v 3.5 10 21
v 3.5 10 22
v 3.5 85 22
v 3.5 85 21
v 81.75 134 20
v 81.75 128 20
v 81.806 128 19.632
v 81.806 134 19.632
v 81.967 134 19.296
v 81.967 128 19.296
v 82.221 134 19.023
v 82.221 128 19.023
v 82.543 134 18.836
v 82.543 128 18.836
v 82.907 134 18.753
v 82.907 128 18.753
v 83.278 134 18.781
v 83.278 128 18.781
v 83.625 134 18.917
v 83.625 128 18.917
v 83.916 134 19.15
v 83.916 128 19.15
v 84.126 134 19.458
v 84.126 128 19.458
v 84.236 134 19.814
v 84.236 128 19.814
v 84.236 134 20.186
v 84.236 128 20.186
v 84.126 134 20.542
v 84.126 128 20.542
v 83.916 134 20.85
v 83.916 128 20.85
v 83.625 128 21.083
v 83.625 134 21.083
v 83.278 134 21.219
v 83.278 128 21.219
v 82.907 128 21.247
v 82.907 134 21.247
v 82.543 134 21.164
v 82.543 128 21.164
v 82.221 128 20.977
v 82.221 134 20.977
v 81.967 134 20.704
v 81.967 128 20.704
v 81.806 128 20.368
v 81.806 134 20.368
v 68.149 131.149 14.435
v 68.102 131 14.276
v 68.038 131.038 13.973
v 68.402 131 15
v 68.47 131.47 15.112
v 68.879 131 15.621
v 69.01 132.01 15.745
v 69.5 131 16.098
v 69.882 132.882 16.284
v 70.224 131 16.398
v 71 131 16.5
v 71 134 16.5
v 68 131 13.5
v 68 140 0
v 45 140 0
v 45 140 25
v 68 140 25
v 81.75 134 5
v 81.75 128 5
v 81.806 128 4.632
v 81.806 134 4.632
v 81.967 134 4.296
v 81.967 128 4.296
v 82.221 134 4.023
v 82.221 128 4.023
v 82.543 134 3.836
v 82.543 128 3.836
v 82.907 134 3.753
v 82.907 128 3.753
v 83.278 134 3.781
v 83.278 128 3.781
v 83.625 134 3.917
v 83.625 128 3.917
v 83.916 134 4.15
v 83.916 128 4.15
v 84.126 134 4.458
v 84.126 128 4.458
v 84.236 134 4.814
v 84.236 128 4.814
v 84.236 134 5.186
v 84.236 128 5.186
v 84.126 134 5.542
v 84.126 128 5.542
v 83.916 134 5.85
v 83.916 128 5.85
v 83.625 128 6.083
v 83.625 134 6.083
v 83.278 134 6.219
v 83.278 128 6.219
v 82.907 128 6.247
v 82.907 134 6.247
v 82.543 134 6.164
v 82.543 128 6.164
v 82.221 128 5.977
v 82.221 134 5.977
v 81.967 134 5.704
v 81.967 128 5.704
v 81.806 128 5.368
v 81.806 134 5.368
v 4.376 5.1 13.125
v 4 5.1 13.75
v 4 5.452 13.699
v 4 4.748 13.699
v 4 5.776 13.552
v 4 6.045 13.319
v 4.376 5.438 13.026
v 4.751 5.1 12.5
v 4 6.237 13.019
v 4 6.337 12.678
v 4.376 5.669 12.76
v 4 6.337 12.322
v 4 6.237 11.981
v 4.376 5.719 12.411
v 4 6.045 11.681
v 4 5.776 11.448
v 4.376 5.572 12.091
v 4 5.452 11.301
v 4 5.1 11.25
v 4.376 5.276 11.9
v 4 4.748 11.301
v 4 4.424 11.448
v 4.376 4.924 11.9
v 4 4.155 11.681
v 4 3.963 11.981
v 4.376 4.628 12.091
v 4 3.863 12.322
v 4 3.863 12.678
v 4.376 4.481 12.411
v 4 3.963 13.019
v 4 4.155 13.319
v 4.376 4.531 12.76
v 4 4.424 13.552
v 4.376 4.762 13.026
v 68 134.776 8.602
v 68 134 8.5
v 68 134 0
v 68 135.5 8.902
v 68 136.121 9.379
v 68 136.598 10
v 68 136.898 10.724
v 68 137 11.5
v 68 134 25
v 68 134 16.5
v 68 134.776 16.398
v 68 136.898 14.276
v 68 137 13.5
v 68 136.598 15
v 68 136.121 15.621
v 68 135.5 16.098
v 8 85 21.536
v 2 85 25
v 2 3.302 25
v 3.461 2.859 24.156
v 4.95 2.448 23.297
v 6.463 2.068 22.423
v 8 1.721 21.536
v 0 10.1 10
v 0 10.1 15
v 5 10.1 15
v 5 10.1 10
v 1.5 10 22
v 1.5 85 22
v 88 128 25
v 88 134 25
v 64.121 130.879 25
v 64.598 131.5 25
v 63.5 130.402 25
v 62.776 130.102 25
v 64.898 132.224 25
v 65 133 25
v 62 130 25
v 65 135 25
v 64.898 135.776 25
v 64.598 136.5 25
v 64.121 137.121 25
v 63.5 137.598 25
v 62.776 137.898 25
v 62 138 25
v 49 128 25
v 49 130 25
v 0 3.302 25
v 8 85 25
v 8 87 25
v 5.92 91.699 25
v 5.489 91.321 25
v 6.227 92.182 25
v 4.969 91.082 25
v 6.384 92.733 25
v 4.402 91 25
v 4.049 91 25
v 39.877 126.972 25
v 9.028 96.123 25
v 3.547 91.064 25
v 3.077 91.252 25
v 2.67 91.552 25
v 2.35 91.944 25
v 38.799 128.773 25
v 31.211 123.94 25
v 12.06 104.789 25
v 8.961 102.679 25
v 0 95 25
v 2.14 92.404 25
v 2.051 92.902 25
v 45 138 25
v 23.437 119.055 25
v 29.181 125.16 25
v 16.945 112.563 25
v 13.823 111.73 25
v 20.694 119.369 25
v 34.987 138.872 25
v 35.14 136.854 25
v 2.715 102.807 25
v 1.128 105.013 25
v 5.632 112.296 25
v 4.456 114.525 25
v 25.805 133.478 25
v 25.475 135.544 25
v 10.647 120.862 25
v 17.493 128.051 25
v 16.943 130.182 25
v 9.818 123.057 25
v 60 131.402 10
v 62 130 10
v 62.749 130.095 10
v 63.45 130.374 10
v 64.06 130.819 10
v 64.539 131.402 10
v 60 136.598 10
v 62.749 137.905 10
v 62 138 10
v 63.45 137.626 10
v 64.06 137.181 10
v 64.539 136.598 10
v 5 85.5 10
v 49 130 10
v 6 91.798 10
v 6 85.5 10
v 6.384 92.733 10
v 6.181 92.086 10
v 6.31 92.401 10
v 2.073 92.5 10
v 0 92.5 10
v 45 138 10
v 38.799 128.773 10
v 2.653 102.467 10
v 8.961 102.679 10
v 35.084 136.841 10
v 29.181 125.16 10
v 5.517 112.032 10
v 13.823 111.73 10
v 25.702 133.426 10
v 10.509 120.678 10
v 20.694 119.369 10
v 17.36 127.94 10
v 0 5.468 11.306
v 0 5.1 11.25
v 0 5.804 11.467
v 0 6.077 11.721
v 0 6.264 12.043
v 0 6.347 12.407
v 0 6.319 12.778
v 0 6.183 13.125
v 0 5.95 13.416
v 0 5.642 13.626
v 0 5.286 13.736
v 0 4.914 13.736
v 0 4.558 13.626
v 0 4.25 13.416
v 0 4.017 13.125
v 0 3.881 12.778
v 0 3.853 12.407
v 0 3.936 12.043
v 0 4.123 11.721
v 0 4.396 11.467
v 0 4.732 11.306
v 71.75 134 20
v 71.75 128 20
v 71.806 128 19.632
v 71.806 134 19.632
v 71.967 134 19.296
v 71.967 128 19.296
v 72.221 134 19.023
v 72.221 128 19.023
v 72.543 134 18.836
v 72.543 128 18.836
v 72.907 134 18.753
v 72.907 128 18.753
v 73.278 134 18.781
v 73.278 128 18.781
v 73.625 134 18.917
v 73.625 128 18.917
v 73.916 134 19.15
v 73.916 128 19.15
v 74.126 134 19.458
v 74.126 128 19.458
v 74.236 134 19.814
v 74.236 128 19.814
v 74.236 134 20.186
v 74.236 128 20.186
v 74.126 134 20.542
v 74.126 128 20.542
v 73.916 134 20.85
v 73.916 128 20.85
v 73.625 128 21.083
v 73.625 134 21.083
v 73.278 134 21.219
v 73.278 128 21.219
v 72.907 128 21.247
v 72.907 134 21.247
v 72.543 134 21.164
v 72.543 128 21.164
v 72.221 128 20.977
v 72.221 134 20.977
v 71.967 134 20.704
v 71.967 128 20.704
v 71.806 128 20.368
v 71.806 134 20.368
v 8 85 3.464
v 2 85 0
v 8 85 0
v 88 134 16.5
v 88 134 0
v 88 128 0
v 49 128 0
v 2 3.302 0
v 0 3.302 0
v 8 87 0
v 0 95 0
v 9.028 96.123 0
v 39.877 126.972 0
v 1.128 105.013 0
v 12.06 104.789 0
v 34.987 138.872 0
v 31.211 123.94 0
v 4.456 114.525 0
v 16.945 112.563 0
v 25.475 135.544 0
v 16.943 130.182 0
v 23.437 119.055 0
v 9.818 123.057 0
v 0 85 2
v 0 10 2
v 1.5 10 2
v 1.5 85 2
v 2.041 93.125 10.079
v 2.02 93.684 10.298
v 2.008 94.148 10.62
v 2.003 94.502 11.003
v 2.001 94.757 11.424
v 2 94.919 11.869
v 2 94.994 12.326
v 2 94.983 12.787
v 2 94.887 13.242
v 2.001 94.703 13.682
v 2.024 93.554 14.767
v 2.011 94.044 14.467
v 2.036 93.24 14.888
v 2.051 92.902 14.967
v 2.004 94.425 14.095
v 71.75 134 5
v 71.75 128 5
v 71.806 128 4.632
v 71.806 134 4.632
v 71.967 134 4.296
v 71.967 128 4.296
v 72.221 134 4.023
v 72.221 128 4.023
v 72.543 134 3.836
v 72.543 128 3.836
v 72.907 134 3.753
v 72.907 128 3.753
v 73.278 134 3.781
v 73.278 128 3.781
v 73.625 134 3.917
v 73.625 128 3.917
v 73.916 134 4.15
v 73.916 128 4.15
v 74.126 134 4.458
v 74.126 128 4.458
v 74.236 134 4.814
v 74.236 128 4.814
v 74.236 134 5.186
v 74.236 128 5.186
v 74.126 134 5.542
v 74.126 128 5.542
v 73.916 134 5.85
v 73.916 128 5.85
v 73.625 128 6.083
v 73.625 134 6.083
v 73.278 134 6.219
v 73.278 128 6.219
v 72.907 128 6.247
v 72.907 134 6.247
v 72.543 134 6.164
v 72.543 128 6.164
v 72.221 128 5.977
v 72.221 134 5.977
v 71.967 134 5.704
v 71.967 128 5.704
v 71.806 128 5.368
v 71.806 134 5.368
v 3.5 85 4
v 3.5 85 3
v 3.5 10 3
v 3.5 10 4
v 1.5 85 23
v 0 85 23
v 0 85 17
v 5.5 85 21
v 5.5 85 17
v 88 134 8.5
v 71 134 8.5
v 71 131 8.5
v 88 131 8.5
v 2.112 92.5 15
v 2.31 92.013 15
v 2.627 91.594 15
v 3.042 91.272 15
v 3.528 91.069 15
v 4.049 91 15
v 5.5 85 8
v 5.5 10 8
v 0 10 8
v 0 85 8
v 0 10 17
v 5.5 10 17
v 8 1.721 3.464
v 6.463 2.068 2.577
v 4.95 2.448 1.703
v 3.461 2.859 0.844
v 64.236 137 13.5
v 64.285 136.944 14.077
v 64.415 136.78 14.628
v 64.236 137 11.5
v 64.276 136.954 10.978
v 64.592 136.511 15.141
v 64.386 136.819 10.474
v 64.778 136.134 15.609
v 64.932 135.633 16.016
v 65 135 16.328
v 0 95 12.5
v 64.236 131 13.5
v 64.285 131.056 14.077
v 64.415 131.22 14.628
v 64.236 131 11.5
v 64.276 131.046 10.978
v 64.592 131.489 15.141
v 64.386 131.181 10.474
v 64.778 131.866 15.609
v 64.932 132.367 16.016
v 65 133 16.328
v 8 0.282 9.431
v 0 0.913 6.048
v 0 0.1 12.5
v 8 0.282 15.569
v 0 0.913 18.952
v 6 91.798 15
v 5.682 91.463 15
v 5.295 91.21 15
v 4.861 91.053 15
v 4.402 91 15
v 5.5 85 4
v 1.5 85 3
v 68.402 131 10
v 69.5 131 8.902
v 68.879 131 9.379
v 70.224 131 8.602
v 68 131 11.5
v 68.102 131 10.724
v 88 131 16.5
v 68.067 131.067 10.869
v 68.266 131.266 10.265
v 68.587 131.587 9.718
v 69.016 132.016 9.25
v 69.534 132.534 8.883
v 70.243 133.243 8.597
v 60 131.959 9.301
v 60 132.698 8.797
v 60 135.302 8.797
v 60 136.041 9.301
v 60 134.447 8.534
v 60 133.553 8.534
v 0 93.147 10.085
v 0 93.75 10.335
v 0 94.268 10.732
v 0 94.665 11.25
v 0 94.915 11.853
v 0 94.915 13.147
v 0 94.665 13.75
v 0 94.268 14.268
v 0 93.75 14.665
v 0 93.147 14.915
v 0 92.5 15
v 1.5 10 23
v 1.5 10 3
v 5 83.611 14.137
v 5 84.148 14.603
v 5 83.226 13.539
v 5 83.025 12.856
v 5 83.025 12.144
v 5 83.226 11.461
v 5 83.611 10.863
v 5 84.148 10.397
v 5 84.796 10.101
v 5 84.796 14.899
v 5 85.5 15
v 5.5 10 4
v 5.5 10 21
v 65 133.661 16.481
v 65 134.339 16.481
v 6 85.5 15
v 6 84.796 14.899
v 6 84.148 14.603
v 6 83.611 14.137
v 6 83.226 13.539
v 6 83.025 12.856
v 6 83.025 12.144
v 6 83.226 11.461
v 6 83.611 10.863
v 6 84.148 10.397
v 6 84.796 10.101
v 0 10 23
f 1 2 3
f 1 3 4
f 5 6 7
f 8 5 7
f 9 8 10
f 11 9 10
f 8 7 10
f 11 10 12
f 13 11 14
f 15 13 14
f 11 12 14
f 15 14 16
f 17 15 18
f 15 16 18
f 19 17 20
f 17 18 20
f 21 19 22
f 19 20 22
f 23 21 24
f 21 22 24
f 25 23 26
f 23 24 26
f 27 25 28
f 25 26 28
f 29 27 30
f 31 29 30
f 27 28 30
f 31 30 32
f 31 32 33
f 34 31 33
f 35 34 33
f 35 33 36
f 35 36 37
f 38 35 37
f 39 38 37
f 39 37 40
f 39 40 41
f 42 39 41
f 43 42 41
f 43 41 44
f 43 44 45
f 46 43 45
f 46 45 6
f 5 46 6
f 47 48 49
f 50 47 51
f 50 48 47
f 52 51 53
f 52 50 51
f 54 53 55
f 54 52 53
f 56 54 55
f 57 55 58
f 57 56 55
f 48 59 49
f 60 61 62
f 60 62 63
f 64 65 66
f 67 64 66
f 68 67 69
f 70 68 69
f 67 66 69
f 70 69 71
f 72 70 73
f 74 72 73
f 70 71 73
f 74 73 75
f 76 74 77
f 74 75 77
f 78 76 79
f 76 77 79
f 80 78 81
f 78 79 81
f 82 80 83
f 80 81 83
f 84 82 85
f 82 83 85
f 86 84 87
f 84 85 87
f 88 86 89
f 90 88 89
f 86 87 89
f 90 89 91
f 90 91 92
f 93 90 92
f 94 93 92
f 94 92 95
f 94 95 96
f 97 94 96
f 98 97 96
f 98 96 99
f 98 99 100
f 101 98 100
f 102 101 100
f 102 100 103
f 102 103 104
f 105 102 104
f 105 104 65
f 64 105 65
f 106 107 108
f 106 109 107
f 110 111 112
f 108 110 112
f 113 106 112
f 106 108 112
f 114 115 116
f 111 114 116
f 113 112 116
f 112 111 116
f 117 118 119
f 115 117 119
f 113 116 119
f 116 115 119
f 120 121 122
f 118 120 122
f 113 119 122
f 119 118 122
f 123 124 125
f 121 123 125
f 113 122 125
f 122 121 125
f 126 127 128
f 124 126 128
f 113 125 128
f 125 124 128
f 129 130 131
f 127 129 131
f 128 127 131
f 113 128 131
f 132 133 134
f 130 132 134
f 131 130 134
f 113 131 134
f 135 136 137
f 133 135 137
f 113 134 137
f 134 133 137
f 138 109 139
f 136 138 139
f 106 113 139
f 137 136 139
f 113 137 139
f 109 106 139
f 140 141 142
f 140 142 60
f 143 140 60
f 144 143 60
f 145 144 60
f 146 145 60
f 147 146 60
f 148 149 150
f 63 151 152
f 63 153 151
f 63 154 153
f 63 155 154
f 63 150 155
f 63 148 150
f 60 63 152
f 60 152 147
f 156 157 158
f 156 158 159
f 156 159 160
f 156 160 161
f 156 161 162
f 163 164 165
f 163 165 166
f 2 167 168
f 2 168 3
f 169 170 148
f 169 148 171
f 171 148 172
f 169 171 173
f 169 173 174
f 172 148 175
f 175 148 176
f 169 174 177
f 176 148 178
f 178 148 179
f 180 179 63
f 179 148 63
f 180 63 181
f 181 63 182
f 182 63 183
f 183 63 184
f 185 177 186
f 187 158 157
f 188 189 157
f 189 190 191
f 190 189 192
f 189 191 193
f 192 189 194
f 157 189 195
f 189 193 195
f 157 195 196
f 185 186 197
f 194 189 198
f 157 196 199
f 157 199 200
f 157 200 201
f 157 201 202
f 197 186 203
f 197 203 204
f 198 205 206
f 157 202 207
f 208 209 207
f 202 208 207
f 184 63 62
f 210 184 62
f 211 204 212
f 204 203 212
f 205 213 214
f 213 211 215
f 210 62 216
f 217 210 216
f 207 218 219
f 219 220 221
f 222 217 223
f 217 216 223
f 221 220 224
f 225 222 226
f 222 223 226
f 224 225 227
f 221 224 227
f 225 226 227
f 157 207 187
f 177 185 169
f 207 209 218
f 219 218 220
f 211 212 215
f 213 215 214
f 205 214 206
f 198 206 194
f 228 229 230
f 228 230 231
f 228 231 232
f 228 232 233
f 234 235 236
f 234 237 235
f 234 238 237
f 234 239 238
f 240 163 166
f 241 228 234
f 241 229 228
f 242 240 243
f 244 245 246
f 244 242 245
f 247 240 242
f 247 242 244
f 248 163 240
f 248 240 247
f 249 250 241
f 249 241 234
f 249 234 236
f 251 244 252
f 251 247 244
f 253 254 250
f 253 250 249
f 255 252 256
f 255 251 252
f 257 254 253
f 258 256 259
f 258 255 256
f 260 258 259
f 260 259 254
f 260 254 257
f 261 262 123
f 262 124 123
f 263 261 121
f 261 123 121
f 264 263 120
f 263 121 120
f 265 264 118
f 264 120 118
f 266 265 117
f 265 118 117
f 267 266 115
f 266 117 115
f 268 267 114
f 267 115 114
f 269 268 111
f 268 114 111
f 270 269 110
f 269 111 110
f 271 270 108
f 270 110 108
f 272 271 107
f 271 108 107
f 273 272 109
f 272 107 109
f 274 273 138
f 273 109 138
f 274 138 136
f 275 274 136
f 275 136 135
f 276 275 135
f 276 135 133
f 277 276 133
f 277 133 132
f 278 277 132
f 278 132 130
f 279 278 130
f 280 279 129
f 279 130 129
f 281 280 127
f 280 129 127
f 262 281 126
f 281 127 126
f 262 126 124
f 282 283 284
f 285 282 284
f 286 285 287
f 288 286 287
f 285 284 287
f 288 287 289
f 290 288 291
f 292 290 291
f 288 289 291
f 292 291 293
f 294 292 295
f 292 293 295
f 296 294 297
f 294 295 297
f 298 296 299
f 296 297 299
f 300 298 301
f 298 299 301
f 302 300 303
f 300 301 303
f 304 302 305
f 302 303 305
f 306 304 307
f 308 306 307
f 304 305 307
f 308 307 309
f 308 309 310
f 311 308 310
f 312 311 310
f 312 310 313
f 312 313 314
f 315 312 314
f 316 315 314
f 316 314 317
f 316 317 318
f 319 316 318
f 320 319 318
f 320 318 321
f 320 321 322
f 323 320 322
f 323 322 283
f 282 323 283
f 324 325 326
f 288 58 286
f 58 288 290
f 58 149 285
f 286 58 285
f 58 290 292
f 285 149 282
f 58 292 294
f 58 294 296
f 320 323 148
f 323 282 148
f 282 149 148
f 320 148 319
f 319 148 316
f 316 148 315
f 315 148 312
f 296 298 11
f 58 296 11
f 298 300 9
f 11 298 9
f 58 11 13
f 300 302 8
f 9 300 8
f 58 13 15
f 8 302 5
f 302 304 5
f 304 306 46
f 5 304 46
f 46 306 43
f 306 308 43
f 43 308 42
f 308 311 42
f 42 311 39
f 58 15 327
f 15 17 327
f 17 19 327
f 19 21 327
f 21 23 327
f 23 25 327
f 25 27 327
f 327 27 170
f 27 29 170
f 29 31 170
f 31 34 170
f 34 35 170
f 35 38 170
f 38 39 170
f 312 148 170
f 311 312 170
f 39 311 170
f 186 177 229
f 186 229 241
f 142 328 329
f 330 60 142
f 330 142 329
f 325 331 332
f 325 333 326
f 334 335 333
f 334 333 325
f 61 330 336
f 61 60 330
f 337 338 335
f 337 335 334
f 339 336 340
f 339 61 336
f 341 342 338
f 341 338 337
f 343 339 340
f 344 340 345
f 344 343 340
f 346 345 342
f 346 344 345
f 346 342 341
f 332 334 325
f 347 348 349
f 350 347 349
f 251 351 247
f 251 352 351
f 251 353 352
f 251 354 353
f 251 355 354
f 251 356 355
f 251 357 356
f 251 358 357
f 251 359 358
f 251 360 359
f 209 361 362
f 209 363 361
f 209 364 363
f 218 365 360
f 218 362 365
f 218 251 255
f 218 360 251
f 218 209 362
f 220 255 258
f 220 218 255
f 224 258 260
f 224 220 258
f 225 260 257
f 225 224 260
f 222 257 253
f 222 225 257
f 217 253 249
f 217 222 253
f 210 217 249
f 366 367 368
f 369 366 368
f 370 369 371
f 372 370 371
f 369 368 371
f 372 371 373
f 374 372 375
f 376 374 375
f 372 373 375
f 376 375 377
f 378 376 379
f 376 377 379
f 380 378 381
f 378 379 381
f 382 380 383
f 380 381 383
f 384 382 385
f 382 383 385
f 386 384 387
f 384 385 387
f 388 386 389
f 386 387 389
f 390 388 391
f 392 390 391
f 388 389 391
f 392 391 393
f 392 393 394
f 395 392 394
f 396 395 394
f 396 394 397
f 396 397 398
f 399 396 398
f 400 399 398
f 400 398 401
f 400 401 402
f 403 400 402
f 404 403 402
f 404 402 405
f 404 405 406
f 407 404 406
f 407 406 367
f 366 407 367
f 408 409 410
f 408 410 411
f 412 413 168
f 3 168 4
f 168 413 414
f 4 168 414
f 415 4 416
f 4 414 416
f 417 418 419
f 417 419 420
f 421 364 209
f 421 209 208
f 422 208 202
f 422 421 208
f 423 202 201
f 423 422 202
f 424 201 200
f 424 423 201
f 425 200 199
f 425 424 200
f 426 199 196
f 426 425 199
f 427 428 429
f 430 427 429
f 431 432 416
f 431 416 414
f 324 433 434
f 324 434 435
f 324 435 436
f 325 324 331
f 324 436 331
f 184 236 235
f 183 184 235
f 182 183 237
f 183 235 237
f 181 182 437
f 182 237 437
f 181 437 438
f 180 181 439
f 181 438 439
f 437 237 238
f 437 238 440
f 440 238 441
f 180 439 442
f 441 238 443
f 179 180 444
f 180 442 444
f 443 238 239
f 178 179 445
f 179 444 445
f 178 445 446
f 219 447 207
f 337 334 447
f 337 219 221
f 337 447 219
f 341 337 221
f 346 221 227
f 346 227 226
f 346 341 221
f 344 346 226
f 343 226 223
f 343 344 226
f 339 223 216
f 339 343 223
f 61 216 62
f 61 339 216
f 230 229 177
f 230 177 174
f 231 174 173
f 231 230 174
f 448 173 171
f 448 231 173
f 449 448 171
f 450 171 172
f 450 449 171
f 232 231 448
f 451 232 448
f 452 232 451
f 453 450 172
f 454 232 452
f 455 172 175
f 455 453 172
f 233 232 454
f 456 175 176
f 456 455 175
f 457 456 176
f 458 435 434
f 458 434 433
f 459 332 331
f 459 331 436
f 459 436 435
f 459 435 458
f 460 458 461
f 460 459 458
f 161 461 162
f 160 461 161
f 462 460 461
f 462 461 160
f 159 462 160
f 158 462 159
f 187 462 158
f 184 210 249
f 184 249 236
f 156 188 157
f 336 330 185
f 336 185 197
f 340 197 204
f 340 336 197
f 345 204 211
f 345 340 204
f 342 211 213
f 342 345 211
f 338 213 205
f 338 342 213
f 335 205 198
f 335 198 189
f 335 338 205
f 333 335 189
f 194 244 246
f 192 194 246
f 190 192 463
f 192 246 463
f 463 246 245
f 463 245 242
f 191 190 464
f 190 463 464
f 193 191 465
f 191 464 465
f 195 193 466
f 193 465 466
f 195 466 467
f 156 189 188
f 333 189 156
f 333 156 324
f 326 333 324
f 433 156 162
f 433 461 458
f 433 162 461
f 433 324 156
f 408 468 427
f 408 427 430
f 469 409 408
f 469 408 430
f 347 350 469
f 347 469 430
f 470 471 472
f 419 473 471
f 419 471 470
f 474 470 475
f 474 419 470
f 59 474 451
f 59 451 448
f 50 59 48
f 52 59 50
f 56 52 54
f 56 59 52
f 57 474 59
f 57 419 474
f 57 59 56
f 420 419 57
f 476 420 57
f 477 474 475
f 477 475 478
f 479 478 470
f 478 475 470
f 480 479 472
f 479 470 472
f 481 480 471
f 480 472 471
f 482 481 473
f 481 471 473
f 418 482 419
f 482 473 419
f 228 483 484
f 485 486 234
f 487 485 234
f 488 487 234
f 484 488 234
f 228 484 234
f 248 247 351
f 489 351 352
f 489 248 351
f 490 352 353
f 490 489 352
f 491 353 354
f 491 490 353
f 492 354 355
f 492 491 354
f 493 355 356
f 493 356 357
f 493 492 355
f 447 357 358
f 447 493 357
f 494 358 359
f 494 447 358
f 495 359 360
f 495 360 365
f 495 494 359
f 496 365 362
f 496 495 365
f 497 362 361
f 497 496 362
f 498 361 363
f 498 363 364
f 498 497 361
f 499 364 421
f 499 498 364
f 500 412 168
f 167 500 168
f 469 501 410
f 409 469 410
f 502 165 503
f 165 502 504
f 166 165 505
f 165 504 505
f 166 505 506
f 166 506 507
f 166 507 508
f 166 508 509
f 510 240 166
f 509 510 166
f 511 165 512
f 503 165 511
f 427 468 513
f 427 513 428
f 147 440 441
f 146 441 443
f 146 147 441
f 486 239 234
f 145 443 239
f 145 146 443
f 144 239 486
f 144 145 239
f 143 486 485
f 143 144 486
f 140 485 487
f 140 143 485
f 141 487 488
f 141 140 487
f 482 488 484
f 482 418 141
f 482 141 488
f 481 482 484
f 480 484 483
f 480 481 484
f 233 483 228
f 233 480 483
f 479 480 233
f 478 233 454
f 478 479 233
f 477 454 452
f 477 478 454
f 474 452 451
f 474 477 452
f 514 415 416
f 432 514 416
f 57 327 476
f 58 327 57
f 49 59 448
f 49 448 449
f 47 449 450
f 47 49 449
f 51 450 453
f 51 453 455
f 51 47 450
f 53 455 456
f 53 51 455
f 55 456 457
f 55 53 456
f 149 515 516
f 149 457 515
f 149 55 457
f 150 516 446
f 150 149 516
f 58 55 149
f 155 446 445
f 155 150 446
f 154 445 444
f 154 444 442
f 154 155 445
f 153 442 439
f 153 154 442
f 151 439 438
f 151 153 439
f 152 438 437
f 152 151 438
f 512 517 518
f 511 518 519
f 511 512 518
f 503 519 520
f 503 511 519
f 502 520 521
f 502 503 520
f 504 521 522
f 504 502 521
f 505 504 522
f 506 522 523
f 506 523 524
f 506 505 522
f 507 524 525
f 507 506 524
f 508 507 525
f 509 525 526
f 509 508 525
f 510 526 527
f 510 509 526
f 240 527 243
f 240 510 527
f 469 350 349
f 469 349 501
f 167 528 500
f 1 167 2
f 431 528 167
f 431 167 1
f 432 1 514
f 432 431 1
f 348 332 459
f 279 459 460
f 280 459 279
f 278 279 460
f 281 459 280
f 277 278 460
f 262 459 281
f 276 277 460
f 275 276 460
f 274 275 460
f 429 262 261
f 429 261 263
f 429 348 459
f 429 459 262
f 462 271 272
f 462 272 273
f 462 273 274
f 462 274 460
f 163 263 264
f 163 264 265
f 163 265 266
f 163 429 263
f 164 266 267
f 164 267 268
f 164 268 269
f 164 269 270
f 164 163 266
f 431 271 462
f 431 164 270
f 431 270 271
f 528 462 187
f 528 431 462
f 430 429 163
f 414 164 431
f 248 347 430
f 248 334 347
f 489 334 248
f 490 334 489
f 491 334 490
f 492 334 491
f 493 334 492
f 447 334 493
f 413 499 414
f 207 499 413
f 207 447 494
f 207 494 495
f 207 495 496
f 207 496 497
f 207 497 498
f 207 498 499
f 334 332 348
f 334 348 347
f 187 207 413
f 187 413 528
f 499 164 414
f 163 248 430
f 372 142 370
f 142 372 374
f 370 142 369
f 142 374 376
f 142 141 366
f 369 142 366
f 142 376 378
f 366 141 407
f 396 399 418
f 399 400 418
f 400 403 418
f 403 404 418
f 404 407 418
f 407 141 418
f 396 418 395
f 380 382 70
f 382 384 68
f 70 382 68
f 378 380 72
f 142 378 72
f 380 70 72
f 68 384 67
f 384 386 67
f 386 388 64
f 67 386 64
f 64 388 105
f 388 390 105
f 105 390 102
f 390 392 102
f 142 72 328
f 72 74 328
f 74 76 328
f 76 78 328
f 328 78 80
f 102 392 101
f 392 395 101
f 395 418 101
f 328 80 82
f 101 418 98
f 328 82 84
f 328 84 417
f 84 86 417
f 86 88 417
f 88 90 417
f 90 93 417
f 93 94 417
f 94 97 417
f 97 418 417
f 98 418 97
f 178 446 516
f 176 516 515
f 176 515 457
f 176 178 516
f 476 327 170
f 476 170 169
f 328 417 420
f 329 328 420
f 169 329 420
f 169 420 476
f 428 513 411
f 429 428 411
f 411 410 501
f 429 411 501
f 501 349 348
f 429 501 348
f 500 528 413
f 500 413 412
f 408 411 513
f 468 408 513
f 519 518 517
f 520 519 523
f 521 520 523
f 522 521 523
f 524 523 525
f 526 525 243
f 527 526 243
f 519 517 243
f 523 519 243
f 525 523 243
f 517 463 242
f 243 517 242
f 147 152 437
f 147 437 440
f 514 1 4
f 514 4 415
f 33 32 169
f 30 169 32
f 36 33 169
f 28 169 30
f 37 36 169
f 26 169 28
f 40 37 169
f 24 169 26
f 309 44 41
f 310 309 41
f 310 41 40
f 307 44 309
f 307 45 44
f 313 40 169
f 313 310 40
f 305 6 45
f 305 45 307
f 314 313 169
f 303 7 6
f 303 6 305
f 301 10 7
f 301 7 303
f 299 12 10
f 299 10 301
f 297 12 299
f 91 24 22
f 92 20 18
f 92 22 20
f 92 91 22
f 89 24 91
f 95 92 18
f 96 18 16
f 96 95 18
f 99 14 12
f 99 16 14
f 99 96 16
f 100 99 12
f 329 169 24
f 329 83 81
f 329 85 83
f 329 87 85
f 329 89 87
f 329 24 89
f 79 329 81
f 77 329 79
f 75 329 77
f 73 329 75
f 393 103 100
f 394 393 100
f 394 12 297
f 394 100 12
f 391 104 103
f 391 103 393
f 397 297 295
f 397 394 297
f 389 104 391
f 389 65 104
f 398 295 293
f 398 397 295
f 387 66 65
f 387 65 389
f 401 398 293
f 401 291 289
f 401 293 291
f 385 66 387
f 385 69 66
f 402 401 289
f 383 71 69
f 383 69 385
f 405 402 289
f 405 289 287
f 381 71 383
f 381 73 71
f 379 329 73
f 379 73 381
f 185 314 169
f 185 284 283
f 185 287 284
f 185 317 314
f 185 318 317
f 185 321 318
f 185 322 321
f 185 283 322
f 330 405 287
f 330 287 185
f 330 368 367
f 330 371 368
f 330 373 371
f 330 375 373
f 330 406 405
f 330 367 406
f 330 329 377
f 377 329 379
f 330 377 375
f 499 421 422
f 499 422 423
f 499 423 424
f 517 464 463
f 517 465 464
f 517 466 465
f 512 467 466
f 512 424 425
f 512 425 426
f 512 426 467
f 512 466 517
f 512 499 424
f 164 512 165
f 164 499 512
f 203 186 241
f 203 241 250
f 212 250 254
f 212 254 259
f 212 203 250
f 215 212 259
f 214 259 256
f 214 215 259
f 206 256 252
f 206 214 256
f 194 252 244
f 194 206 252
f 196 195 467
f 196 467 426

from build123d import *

# Parameters (mm, degrees)
EXTRUDE_1_DEPTH      = 25
SKETCH_2_W           = 20.000000000000014
SKETCH_2_H           = 6
CUT_EXTRUDE_1_DEPTH  = 168.23934943666816
CUT_EXTRUDE_2_DEPTH  = 85
CUT_EXTRUDE_4_DEPTH  = 5
CUT_EXTRUDE_3_REACH  = 169.239
FILLET_3_R           = 2
FILLET_4_R           = 3
CUT_EXTRUDE_6_DEPTH  = 75
M3X0_51_D            = 2.5
CUT_EXTRUDE_7_REACH  = 169.239
CUT_EXTRUDE_8_DEPTH  = 3
FILLET_8_R           = 3
CUT_EXTRUDE_9_DEPTH  = 28
CUT_EXTRUDE_10_DEPTH = 6
EXTRUDE_2_DEPTH      = 5
M3X0_52_D            = 2.5
M3X0_52_DEPTH        = 4
M3X0_52_TIP          = 0.7510757737844503


with BuildPart() as part:
    # Эскиз1 → Бобышка-Вытянуть1 (new body)
    with BuildSketch(Plane.XY):
        with BuildLine():
            Line((0, 0), (0, 95))
            ThreePointArc((0, 95), (13.18019484660537, 126.81980515339464), (45, 140))
            Line((45, 140), (88, 140))
            Line((88, 140), (88, 128))
            Line((88, 128), (49, 127.99999999999997))
            ThreePointArc((49, 127.99999999999997), (20.00862197135158, 115.99137802864843), (8.000000000000002, 87))
            Line((8.000000000000002, 87), (8, 0))
            Line((8, 0), (0, 0))
        make_face()
    extrude(amount=EXTRUDE_1_DEPTH)

    # Эскиз2 → Вырез-Вытянуть1 (cut, through all)
    with BuildSketch(Plane.XY.offset(25)):
        with Locations((78, 137)):
            Rectangle(SKETCH_2_W, SKETCH_2_H)
    extrude(amount=-CUT_EXTRUDE_1_DEPTH, mode=Mode.SUBTRACT)

    # Эскиз5 → Вырез-Вытянуть2 (cut)
    with BuildSketch(Plane.XZ):
        Polygon((8, 3.4641016151377366), (2, 0), (8, 0), (10.194072484648698, 0), (10.1940724846487, 4.730849954771208), align=None)
        Polygon((1.9999999999999971, 25), (7.999999999999993, 25), (10.194072484648695, 25), (10.194072484648698, 20.26915004522879), (7.999999999999998, 21.535898384862264), align=None)
    extrude(amount=-CUT_EXTRUDE_2_DEPTH, mode=Mode.SUBTRACT)

    # Эскиз6 → Вырез-Вытянуть4 (cut)
    with BuildSketch(Plane.ZY):
        with BuildLine():
            Line((10.000000000000004, -11.916065179701535), (10.000000000000004, 92.5))
            ThreePointArc((10.000000000000004, 92.5), (12.500000000000004, 95), (15.000000000000005, 92.5))
            Line((15.000000000000005, 92.5), (15.000000000000005, -11.916065179701535))
            ThreePointArc((15.000000000000005, -11.916065179701535), (12.500000000000004, -14.416065179701535), (10.000000000000004, -11.916065179701535))
        make_face()
    extrude(amount=-CUT_EXTRUDE_4_DEPTH, mode=Mode.SUBTRACT)

    # Вырез-Вытянуть3: up to this face of the body (flat: up to its plane)
    cut_extrude_3_end = Plane(part.part.faces().sort_by_distance((2.5, 46.25, 10))[0])
    # Эскиз3 → Вырез-Вытянуть3 (cut, up to the picked face)
    with BuildSketch(Plane(origin=(0, 0, 25), x_dir=(-1, 0, 0), z_dir=(0, 0, -1)), mode=Mode.PRIVATE) as cut_extrude_3_sk1:
        with BuildLine():
            Line((-64.99999999999999, 138), (-64.99999999999999, 130))
            Line((-64.99999999999999, 130), (-49.00000000000001, 130))
            ThreePointArc((-49.00000000000001, 130), (-20.04313552885945, 118.78836265050464), (-6.186450742784722, 90.9999999999999))
            Line((-6.186450742784722, 90.9999999999999), (-2.186450742784722, 90.9999999999999))
            ThreePointArc((-2.186450742784722, 90.9999999999999), (-13.211637349495152, 123.9568644711403), (-44.999999999999545, 138))
            Line((-44.999999999999545, 138), (-64.99999999999999, 138))
        make_face()
    cut_extrude_3_tool1 = split(extrude(cut_extrude_3_sk1.sketch, amount=CUT_EXTRUDE_3_REACH, mode=Mode.PRIVATE), bisect_by=cut_extrude_3_end, keep=Keep.BOTH, mode=Mode.PRIVATE)
    add(cut_extrude_3_tool1.solids().sort_by(Axis((55, 137.213997, 25), (0, 0, -1)))[0], mode=Mode.SUBTRACT)

    # Скругление3
    fillet_3_edges = [part.edges().sort_by_distance(p)[0] for p in [
        (6.186450742784729, 90.9999999999999, 17.5),
        (2.186450742784718, 90.9999999999999, 20.000000000000004),
    ]]
    fillet(fillet_3_edges, radius=FILLET_3_R)

    # Скругление4
    fillet_4_edges = [part.edges().sort_by_distance(p)[0] for p in [
        (64.99999999999999, 138, 17.5),
        (64.99999999999999, 130, 17.5),
    ]]
    fillet(fillet_4_edges, radius=FILLET_4_R)

    # Эскиз8 → Вырез-Вытянуть6 (cut)
    with BuildSketch(Plane(origin=(0, 10, 0), x_dir=(1, 0, 0), z_dir=(0, 1, 0))):
        Polygon((0, -2), (1.5, -2), (1.5, -3), (3.4999999999999996, -3), (3.4999999999999996, -4.0000000000000036), (5.499999999999993, -4.0000000000000036), (5.499999999999994, -8.000000000000004), (0, -8.000000000000004), align=None)
        Polygon((3.500000000000003, -22.000000000000004), (3.500000000000003, -20.999999999999996), (5.499999999999995, -20.999999999999996), (5.499999999999996, -16.999999999999996), (6.94e-15, -16.999999999999996), (6.94e-15, -23), (1.5000000000000036, -23), (1.5000000000000036, -22.000000000000004), align=None)
    extrude(amount=CUT_EXTRUDE_6_DEPTH, mode=Mode.SUBTRACT)

    # Отверстие обработанное метчиком M3x0.51 (through all)
    with Locations(Plane(origin=(19.191951444358242, 134, 18.79968596761044), x_dir=(1, 0, 0), z_dir=(0, 1, 0))):
        with Locations((53.808048556, 13.799685968), (63.808048556, 13.799685968), (63.808048556, -1.200314032), (53.808048556, -1.200314032)):
            Hole(M3X0_51_D / 2)

    # Эскиз12 → Вырез-Вытянуть7 (cut, up to next)
    with BuildSketch(Plane.ZY, mode=Mode.PRIVATE) as cut_extrude_7_sk1:
        with BuildLine():
            Line((0, 3.301973769644008), (0, 0))
            Line((0, 0), (12.500000000000004, -3.47e-15))
            Line((12.500000000000004, -3.47e-15), (25, 0))
            Line((25, 0), (25, 3.301973769644008))
            ThreePointArc((25, 3.301973769644008), (12.500000000000005, 0.10000000000000142), (0, 3.301973769644008))
        make_face()
    cut_extrude_7_tool1 = extrude(cut_extrude_7_sk1.sketch, amount=-CUT_EXTRUDE_7_REACH, mode=Mode.PRIVATE) & part.part
    add(cut_extrude_7_tool1.solids().sort_by_distance((0, 1.650987, 0.252171))[0], mode=Mode.SUBTRACT)

    # Эскиз13 → Вырез-Вытянуть8 (cut)
    with BuildSketch(Plane(origin=(0, 134, 0), x_dir=(1, 0, 0), z_dir=(0, 1, 0))):
        Polygon((68.00000000000009, -8.5), (88.00000000000001, -8.499999999999996), (88.00000000000001, -16.5), (68.00000000000009, -16.499999999999996), align=None)
    extrude(amount=-CUT_EXTRUDE_8_DEPTH, mode=Mode.SUBTRACT)

    # Скругление8
    fillet_8_edges = [part.edges().sort_by_distance(p)[0] for p in [
        (68.00000000000009, 132.5, 16.499999999999996),
        (68.00000000000009, 132.5, 8.5),
    ]]
    fillet(fillet_8_edges, radius=FILLET_8_R)

    # Эскиз14 → Вырез-Вытянуть9 (cut)
    with BuildSketch(Plane(origin=(88, 0, 0), x_dir=(0, 0, -1), z_dir=(1, -1.16e-15, 0))):
        with BuildLine():
            Line((-13.499999999999998, 137), (-11.5, 137))
            ThreePointArc((-11.5, 137), (-8.5, 134), (-11.5, 131))
            Line((-11.5, 131), (-13.499999999999998, 131))
            ThreePointArc((-13.499999999999998, 131), (-16.5, 134), (-13.499999999999998, 137))
        make_face()
    extrude(amount=-CUT_EXTRUDE_9_DEPTH, mode=Mode.SUBTRACT)

    # Эскиз15 → Вырез-Вытянуть10 (cut)
    with BuildSketch(Plane.ZY):
        with BuildLine():
            Line((15.000000000000004, 92.5), (15.000000000000004, 85.49999999999999))
            ThreePointArc((15.000000000000004, 85.49999999999999), (12.500000000000005, 82.99999999999999), (10.000000000000007, 85.49999999999999))
            Line((10.000000000000007, 85.49999999999999), (10.000000000000005, 92.5))
            ThreePointArc((10.000000000000005, 92.5), (12.500000000000004, 95), (15.000000000000004, 92.5))
        make_face()
    extrude(amount=-CUT_EXTRUDE_10_DEPTH, mode=Mode.SUBTRACT)

    # Эскиз19 → Бобышка-Вытянуть2 (add)
    with BuildSketch(Plane.ZY):
        with BuildLine():
            Line((10.000000000000002, 10.100000000000001), (10.000000000000004, 0.22047141078493024))
            ThreePointArc((10.000000000000004, 0.22047141078493024), (12.500000000000005, 0.09999999999999787), (15.000000000000004, 0.22047141078493718))
            Line((15.000000000000004, 0.22047141078493718), (15.000000000000002, 10.100000000000001))
            Line((15.000000000000002, 10.100000000000001), (10.000000000000002, 10.100000000000001))
        make_face()
    extrude(amount=-EXTRUDE_2_DEPTH)

    # Отверстие обработанное метчиком M3x0.52
    with Locations(Plane.ZY):
        with Locations((12.5, 5.1)):
            Hole(M3X0_52_D / 2, depth=M3X0_52_DEPTH)
            with Locations((0, 0, -(M3X0_52_DEPTH + M3X0_52_TIP / 2))):  # 118° drill point
                Cone(0, M3X0_52_D / 2, M3X0_52_TIP, mode=Mode.SUBTRACT)


solid = part.part
